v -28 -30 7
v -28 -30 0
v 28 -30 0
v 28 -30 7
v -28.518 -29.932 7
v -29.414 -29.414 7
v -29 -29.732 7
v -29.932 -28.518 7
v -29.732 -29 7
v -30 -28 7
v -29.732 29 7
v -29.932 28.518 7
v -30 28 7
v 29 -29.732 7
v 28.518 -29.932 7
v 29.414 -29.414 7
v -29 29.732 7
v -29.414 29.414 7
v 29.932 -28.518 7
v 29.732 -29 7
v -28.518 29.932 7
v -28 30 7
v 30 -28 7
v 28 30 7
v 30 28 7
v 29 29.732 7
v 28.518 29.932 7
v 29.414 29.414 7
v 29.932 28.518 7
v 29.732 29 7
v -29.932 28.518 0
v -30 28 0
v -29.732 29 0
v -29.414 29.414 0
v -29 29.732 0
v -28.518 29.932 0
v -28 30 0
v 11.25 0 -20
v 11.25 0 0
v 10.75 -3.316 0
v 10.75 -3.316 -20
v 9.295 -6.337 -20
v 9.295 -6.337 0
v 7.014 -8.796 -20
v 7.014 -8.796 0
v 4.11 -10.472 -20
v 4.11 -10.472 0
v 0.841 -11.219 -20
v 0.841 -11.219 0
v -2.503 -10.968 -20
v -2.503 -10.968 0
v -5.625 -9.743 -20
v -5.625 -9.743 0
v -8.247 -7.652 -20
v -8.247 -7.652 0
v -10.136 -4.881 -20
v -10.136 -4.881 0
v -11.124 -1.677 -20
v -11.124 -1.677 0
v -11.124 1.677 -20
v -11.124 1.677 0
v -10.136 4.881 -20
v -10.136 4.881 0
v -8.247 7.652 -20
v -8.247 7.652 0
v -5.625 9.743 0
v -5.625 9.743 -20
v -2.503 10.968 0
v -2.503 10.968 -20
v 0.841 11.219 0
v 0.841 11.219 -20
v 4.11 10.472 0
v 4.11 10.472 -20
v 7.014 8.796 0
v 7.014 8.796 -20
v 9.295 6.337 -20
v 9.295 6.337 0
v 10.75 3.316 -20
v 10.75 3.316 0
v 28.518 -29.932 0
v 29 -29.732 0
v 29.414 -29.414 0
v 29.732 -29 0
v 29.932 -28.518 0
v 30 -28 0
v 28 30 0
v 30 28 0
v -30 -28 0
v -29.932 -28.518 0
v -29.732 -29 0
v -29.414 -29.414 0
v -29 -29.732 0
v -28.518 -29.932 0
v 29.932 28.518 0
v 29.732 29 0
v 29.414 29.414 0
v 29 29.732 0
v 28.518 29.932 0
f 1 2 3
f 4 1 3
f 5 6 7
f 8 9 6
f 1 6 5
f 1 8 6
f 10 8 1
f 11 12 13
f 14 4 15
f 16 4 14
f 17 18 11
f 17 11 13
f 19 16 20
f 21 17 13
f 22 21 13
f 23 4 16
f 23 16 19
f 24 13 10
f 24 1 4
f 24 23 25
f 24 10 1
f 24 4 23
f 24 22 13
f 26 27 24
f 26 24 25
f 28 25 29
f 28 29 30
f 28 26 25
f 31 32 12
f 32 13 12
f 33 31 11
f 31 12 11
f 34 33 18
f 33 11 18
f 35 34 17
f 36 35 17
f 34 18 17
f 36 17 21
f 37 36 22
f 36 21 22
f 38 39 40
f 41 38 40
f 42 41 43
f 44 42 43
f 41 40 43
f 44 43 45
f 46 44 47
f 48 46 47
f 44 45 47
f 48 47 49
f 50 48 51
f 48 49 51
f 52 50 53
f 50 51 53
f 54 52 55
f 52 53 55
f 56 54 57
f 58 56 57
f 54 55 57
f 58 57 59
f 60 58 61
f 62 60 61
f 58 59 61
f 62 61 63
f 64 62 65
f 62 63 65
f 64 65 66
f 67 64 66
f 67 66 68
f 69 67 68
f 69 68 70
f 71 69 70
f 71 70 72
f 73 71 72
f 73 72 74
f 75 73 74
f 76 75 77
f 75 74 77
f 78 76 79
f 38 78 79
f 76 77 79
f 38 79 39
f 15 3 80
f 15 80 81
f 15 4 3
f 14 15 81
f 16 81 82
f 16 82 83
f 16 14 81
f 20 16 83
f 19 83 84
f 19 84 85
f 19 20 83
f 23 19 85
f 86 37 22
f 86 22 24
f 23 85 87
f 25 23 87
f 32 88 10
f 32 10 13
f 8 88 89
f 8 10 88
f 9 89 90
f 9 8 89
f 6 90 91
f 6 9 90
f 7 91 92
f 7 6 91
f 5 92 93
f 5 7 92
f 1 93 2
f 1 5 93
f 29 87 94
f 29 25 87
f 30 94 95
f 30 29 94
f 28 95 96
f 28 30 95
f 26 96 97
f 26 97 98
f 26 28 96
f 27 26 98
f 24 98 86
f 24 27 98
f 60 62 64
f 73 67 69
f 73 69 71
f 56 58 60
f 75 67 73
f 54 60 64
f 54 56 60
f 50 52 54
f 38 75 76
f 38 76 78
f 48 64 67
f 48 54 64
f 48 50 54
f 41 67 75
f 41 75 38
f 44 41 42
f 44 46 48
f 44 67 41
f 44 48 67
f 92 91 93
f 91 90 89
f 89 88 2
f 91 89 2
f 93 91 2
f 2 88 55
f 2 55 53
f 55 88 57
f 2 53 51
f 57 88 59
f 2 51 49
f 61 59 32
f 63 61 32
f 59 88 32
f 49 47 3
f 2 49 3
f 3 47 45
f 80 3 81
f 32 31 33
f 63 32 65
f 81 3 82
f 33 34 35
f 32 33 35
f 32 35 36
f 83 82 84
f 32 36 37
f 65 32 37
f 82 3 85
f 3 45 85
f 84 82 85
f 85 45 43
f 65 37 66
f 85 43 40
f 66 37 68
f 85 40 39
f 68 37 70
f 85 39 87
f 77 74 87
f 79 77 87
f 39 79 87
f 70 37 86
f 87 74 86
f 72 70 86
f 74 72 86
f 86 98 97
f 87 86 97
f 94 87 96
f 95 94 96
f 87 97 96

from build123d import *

# Parameters (mm, degrees)
ESQUISSE1_W          = 60
ESQUISSE1_H          = 60
BASE_EXTRUSION_DEPTH = 7
CONG_2_R             = 2
ESQUISSE14_R         = 11.25
BOSS_EXTRU_12_DEPTH  = 20


with BuildPart() as part:
    # Esquisse1 → Base-Extrusion (new body)
    with BuildSketch(Plane.XY):
        Rectangle(ESQUISSE1_W, ESQUISSE1_H)
    extrude(amount=BASE_EXTRUSION_DEPTH)

    # Congé2
    cong_2_edges = [part.edges().sort_by_distance(p)[0] for p in [
        (-30, 30, 3.5),
        (30, 30, 3.5),
        (30, -30, 3.5),
        (-30, -30, 3.5),
    ]]
    fillet(cong_2_edges, radius=CONG_2_R)

    # Esquisse14 → Boss.-Extru.12 (add)
    with BuildSketch(Plane(origin=(0, 0, 0), x_dir=(-1, 0, 0), z_dir=(0, 0, -1))):
        with Locations(Location((0, 0, 0), (0, 0, 180))):
            Circle(ESQUISSE14_R)
    extrude(amount=BOSS_EXTRU_12_DEPTH)


solid = part.part
